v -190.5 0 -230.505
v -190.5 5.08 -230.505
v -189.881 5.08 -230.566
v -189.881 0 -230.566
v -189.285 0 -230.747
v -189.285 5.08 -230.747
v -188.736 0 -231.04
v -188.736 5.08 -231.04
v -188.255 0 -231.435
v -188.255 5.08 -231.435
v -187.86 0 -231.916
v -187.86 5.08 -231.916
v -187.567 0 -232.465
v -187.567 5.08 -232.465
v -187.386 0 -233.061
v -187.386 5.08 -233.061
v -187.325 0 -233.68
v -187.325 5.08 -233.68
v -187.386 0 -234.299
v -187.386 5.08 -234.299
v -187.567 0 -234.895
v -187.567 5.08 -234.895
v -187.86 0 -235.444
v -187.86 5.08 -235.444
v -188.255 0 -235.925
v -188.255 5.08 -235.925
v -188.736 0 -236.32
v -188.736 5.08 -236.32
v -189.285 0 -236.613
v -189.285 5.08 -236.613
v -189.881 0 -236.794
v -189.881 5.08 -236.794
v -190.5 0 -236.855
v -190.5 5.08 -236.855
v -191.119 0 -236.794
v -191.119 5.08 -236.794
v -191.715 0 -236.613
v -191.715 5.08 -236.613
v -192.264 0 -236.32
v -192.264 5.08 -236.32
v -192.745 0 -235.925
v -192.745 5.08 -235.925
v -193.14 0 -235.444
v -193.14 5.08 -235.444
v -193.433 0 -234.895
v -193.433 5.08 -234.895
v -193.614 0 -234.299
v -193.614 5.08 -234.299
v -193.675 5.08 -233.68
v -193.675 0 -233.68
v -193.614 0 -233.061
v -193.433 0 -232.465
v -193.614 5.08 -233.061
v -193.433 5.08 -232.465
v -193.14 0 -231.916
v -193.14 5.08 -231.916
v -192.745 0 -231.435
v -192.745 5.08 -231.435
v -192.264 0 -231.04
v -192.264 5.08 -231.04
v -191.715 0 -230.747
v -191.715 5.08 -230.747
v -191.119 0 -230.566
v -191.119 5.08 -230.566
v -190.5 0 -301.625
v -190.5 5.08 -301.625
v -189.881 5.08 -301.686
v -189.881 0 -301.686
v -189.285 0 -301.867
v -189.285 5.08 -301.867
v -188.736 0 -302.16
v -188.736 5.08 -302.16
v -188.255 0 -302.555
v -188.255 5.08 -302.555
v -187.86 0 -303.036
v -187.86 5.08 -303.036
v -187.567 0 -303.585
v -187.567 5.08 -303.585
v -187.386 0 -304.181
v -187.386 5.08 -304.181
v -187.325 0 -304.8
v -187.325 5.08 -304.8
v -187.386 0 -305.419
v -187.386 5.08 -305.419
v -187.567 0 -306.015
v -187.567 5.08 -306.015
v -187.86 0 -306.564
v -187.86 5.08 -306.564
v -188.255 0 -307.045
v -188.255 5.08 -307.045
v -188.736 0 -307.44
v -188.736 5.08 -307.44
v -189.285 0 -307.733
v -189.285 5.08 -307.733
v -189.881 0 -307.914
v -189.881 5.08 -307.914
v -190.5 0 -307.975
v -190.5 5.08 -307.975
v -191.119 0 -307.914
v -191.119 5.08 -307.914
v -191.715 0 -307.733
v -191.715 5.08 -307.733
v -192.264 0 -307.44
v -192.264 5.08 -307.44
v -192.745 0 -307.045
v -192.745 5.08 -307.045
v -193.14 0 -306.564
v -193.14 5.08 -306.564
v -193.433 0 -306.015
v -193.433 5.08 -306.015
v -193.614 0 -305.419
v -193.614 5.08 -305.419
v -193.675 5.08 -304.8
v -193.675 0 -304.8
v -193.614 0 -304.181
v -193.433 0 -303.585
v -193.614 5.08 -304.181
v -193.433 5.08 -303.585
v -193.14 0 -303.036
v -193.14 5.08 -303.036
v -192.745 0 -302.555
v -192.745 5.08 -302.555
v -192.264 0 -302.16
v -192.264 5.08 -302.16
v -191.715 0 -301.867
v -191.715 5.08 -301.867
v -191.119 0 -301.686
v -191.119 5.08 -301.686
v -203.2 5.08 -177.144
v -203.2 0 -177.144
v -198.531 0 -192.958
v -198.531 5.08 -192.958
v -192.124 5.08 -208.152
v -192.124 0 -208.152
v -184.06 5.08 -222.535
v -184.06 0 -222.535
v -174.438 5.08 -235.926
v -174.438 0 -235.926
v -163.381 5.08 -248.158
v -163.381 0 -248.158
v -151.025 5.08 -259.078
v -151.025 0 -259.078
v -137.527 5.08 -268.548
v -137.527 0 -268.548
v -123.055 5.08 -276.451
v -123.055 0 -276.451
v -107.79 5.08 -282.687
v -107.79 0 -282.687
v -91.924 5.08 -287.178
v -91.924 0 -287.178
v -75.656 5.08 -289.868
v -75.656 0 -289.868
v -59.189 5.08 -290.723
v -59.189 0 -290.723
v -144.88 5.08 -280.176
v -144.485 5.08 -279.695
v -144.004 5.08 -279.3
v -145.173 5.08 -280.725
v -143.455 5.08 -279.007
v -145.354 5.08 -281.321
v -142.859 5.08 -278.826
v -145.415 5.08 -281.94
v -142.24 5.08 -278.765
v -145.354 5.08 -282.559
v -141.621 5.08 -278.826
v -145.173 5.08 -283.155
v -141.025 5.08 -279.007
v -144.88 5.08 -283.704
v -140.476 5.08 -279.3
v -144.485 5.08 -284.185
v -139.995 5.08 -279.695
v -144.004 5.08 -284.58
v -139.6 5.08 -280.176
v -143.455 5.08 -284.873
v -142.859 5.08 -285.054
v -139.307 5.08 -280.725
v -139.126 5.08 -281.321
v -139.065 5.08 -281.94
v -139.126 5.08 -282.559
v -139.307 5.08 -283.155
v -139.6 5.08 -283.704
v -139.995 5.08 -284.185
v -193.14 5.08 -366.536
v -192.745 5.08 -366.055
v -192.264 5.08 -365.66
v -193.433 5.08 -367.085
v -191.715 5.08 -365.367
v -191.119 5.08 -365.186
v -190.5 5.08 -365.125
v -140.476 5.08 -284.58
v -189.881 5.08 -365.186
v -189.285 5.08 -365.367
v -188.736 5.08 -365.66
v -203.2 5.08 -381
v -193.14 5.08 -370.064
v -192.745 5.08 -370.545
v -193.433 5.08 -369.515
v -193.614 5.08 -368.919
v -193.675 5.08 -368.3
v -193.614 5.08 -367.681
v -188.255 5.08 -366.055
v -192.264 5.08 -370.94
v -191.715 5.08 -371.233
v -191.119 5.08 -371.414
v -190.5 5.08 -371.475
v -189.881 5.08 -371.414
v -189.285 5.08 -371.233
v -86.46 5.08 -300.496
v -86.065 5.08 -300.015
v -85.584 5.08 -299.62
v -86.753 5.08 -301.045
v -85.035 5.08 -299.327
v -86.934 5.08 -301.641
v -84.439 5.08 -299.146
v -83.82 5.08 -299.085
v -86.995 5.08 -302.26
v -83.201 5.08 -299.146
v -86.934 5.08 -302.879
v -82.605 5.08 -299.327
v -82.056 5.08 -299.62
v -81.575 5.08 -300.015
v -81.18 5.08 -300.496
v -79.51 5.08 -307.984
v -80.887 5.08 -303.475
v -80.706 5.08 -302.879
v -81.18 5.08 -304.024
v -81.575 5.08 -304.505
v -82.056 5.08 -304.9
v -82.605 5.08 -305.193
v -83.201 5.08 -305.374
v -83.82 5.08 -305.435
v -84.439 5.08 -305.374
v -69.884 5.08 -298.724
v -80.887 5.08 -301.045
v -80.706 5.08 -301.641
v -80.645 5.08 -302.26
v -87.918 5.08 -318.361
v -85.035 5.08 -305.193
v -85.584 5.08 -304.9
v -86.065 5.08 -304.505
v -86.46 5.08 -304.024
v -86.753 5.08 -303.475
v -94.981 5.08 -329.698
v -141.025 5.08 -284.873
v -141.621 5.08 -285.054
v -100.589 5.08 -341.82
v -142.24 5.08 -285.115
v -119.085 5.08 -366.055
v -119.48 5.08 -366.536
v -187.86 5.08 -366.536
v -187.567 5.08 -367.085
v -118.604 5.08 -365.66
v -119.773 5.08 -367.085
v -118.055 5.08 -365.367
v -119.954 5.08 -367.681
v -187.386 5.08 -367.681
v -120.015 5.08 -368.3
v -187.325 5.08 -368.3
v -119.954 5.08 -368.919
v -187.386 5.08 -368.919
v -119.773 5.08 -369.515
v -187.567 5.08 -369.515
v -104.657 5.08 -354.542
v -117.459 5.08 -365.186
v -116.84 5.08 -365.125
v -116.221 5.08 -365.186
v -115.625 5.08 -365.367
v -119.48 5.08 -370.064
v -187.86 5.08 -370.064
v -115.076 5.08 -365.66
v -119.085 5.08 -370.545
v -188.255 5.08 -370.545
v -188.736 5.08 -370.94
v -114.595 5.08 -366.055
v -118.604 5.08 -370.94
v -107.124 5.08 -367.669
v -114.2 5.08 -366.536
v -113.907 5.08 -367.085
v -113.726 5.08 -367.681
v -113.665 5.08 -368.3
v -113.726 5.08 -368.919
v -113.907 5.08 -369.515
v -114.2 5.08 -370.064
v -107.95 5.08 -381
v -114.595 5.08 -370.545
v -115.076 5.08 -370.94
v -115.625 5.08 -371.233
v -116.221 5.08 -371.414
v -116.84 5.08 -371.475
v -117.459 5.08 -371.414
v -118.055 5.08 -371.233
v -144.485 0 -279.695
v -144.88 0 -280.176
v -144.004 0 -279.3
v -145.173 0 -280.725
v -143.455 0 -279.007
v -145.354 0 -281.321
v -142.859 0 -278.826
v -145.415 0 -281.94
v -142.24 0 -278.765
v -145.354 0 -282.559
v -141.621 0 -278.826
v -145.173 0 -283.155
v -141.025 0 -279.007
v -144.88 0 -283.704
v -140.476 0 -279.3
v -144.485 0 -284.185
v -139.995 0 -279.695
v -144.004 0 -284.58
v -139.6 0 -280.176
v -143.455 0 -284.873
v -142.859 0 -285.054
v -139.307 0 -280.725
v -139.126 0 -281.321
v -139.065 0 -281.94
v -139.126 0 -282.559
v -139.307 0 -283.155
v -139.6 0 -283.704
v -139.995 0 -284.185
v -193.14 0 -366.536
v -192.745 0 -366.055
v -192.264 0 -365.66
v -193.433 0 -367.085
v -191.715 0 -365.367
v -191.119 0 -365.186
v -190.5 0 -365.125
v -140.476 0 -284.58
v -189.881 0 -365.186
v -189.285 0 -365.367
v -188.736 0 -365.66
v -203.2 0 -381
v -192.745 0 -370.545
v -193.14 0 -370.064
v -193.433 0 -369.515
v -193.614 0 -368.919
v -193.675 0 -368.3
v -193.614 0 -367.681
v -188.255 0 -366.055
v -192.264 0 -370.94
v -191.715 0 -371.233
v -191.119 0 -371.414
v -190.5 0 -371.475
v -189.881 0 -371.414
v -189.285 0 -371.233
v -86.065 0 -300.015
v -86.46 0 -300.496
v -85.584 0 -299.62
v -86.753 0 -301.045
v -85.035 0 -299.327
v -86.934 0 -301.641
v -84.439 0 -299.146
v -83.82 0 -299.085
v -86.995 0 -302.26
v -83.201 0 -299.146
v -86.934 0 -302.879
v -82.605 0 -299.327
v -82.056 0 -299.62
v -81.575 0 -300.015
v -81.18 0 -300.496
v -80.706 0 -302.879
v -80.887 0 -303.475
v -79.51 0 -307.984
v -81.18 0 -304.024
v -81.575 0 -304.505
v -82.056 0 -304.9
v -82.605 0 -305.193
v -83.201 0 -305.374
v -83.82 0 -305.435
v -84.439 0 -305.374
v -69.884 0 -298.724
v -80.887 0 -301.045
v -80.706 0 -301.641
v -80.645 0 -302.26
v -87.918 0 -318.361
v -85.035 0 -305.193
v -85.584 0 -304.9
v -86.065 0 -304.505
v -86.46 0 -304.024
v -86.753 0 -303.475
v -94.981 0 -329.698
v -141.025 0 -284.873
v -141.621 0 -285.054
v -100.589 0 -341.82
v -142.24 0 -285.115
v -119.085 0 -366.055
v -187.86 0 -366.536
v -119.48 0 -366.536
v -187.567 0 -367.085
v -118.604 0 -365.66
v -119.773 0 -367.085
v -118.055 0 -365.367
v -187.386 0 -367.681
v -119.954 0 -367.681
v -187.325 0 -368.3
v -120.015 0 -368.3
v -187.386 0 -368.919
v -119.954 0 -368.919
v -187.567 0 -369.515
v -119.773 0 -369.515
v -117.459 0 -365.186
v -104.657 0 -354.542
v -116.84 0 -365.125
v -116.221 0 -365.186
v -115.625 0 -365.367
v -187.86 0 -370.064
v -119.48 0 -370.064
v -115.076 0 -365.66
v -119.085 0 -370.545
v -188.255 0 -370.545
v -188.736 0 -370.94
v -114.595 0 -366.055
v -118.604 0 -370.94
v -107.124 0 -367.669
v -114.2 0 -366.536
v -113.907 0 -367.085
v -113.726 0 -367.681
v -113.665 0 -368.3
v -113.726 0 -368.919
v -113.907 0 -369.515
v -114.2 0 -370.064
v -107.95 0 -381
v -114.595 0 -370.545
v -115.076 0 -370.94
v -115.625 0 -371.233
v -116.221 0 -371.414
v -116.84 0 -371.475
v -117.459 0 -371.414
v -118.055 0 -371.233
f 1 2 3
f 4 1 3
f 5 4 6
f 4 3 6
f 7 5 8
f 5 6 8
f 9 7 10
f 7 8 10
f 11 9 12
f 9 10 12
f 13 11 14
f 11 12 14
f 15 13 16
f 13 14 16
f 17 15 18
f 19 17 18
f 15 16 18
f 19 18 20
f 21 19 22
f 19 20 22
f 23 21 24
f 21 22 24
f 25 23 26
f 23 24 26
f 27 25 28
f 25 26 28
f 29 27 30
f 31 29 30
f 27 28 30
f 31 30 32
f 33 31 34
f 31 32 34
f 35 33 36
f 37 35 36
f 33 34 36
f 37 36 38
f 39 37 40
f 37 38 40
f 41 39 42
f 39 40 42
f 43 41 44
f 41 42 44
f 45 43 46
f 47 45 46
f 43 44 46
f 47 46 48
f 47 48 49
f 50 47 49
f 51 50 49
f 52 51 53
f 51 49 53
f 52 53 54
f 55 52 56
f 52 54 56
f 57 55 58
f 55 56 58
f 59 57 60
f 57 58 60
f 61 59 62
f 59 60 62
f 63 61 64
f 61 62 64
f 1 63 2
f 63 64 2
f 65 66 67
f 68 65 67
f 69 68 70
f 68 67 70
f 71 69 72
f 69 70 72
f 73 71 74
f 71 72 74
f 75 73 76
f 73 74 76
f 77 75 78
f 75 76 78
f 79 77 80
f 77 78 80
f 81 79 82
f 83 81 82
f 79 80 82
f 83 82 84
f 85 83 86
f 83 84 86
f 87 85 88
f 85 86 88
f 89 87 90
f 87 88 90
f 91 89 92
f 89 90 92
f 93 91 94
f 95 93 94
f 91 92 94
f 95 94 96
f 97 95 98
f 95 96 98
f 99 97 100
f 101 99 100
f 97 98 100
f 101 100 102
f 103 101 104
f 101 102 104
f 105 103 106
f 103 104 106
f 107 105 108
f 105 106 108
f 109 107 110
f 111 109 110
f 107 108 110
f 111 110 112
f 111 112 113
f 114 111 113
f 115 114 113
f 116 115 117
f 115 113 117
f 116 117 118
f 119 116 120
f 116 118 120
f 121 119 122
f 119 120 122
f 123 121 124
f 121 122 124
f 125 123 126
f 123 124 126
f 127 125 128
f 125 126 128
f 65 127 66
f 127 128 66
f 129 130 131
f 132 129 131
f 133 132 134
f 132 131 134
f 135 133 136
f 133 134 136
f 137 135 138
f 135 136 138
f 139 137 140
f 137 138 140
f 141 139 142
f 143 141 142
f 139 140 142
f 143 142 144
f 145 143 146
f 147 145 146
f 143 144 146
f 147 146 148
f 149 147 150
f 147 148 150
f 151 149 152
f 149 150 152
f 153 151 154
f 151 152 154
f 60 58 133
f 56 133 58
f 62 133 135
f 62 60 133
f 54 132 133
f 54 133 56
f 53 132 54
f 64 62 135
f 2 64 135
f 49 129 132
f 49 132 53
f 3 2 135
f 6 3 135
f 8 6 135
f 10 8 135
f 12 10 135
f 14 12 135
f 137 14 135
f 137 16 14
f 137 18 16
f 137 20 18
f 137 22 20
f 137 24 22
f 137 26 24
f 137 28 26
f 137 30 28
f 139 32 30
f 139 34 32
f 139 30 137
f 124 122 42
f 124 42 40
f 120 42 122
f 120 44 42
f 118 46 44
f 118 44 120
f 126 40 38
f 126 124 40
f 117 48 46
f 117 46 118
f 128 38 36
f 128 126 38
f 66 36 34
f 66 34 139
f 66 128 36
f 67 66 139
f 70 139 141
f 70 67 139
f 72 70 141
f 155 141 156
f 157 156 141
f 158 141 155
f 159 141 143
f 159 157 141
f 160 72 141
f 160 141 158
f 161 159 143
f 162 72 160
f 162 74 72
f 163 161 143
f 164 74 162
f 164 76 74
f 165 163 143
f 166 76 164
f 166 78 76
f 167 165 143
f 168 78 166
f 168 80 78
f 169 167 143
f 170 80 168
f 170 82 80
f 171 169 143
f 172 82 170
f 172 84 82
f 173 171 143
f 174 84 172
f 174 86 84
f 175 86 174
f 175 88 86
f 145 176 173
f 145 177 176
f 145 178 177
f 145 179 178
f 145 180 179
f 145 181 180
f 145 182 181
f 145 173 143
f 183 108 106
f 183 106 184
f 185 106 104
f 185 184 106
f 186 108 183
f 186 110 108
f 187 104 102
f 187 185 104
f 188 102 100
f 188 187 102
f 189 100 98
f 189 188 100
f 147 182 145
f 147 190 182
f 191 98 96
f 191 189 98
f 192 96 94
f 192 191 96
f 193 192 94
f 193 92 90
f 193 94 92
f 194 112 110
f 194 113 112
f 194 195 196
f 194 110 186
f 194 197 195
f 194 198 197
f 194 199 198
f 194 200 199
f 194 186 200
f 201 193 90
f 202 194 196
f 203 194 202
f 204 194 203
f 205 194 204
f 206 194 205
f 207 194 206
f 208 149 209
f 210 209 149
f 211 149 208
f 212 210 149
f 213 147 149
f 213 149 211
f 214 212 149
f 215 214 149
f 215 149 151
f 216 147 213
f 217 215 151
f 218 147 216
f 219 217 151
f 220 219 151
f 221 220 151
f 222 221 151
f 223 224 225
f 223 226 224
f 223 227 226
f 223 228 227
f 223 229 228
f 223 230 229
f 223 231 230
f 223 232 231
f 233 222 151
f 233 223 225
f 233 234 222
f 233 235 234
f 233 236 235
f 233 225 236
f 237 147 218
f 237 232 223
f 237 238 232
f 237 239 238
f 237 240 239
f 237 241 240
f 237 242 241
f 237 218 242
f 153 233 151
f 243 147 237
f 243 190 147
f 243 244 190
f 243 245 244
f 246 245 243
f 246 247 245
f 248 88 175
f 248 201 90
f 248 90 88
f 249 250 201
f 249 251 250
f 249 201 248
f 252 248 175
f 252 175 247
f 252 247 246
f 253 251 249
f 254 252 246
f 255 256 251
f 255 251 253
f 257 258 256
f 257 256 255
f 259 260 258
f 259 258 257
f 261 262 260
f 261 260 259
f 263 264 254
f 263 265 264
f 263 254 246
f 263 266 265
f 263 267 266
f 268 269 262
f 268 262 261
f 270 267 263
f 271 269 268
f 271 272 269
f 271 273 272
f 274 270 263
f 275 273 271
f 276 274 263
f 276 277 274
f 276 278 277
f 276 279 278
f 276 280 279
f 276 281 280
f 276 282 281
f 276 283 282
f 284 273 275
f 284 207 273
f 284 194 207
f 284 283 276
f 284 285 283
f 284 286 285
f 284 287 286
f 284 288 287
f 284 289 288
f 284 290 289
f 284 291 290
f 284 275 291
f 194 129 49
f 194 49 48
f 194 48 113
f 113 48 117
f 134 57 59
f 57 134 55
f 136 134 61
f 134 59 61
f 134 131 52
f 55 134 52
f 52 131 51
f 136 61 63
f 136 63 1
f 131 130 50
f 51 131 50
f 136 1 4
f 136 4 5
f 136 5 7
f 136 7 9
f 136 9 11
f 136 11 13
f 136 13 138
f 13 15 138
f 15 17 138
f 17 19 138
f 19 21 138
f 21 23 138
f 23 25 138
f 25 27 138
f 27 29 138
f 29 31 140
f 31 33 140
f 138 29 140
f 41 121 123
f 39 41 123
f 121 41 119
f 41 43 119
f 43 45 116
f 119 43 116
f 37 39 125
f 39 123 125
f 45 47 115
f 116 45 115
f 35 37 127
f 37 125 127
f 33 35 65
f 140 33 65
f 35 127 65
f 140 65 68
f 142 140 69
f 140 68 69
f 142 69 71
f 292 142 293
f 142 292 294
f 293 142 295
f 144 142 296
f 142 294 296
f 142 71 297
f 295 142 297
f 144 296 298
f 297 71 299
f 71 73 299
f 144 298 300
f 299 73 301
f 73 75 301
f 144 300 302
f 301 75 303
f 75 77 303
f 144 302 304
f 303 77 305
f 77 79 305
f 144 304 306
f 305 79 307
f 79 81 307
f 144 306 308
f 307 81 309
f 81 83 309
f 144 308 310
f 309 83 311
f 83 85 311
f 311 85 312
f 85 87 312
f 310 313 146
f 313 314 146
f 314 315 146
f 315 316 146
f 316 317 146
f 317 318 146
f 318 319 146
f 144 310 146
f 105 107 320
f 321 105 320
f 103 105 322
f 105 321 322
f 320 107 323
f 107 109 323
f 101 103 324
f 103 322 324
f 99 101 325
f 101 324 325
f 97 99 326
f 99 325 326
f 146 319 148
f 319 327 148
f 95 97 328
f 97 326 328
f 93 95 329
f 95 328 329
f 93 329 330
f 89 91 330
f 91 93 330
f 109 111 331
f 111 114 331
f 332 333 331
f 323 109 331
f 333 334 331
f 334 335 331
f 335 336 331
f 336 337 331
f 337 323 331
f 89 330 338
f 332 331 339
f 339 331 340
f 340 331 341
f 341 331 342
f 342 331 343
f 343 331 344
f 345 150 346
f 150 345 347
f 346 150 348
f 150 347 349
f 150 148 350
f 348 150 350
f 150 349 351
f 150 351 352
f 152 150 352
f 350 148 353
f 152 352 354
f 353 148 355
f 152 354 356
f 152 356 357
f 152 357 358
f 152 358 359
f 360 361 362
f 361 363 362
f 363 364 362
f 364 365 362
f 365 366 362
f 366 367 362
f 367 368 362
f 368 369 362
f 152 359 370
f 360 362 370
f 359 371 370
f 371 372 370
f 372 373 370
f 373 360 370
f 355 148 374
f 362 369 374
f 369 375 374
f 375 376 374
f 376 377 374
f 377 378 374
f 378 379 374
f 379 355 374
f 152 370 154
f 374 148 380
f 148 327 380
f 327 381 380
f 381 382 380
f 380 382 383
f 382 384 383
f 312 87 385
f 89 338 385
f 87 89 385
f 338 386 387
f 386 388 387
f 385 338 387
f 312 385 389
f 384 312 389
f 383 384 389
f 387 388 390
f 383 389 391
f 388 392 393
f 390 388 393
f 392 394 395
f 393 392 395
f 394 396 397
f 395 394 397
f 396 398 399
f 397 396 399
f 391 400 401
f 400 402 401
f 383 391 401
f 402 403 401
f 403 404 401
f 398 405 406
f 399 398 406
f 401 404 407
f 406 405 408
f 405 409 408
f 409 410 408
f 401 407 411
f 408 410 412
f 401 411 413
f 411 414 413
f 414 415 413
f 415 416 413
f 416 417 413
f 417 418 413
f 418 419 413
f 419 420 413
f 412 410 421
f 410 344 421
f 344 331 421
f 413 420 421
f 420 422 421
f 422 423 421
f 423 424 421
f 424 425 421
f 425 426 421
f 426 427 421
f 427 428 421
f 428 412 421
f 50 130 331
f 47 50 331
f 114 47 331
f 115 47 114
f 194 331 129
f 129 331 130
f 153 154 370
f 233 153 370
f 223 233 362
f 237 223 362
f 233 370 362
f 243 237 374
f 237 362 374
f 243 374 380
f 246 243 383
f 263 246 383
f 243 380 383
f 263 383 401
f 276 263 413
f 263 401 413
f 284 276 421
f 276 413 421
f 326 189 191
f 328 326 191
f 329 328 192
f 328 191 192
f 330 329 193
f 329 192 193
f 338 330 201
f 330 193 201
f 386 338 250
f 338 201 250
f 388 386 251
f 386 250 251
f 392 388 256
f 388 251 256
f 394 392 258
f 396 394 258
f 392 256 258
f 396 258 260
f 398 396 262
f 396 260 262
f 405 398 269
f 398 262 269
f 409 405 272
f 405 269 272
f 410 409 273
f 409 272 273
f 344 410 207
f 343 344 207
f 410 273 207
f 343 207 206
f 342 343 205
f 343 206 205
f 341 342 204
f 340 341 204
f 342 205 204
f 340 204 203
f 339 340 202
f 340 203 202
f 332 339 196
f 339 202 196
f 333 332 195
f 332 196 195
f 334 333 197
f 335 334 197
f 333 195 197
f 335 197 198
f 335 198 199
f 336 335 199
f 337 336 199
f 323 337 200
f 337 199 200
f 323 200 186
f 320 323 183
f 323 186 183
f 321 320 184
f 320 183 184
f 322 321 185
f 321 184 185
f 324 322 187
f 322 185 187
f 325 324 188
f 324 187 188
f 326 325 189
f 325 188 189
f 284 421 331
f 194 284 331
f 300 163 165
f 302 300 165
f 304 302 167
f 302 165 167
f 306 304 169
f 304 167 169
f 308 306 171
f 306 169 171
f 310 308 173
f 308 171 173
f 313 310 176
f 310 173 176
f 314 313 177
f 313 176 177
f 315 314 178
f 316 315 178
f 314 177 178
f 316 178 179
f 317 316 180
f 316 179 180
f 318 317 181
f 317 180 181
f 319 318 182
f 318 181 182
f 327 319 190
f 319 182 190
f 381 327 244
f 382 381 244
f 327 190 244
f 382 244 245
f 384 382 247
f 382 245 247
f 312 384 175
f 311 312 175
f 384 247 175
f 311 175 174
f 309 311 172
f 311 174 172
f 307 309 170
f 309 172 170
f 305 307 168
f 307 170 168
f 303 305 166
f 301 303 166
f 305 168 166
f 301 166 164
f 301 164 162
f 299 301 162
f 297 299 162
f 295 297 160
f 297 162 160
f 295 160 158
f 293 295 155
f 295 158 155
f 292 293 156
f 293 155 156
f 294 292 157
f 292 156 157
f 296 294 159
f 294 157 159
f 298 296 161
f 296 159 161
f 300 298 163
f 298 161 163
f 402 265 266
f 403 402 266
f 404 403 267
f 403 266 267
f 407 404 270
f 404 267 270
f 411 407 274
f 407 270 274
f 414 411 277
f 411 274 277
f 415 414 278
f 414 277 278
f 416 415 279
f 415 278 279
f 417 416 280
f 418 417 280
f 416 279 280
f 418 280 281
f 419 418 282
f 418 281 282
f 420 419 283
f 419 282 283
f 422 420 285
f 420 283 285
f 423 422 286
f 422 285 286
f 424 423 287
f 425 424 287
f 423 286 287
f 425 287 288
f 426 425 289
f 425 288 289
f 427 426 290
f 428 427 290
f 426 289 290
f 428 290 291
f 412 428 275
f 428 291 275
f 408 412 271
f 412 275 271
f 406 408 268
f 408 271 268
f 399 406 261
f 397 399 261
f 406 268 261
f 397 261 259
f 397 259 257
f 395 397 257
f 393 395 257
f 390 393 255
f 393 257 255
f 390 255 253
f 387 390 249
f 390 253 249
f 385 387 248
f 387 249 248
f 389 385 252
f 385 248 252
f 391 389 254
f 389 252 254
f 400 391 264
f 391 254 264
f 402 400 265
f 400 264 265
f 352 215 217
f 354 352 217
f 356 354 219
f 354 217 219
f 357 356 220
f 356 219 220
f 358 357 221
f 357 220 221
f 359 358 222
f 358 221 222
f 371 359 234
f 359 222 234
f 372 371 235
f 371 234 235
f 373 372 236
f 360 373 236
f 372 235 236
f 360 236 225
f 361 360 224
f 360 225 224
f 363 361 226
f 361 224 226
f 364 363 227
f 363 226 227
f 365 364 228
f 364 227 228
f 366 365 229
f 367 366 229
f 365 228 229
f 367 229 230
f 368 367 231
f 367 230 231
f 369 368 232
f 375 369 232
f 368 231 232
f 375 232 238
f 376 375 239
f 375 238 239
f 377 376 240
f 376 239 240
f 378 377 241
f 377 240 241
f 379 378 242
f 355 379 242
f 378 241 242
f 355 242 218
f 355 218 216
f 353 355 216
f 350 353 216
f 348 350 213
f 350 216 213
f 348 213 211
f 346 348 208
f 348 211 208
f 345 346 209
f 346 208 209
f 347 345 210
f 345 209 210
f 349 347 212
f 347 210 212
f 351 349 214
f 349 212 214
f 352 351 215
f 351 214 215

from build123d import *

# Parameters (mm, degrees)
BOSS_EXTRUDE1_DEPTH = 5.08
SKETCH2_R           = 3.175
CUT_EXTRUDE1_DEPTH  = 5.08


with BuildPart() as part:
    # Sketch1 → Boss-Extrude1 (new body)
    with BuildSketch(Plane(origin=(0, 0, 0), x_dir=(1, 0, 0), z_dir=(0, 1, 0))):
        with BuildLine():
            Line((-203.2, 381), (-203.2, 177.143917216))
            ThreePointArc((-203.2, 177.143917216), (-151.025197649, 259.077837422), (-59.18865855, 290.723174629))
            ThreePointArc((-59.18865855, 290.723174629), (-94.980572199, 329.698017536), (-107.95, 381))
            Line((-107.95, 381), (-203.2, 381))
        make_face()
    extrude(amount=BOSS_EXTRUDE1_DEPTH)

    # Sketch2 → Cut-Extrude1 (cut)
    with BuildSketch(Plane(origin=(0, 5.08, 0), x_dir=(1, 0, 0), z_dir=(0, 1, 0))):
        with Locations(Location((-190.5, 233.68, 0), (0, 0, 270))):
            Circle(SKETCH2_R)
        with Locations(Location((-83.82, 302.26, 0), (0, 0, 270))):
            Circle(SKETCH2_R)
        with Locations(Location((-116.84, 368.3, 0), (0, 0, 270))):
            Circle(SKETCH2_R)
        with Locations(Location((-190.5, 368.3, 0), (0, 0, 270))):
            Circle(SKETCH2_R)
        with Locations(Location((-142.24, 281.94, 0), (0, 0, 270))):
            Circle(SKETCH2_R)
        with Locations(Location((-190.5, 304.8, 0), (0, 0, 270))):
            Circle(SKETCH2_R)
    extrude(amount=-CUT_EXTRUDE1_DEPTH, mode=Mode.SUBTRACT)


solid = part.part
